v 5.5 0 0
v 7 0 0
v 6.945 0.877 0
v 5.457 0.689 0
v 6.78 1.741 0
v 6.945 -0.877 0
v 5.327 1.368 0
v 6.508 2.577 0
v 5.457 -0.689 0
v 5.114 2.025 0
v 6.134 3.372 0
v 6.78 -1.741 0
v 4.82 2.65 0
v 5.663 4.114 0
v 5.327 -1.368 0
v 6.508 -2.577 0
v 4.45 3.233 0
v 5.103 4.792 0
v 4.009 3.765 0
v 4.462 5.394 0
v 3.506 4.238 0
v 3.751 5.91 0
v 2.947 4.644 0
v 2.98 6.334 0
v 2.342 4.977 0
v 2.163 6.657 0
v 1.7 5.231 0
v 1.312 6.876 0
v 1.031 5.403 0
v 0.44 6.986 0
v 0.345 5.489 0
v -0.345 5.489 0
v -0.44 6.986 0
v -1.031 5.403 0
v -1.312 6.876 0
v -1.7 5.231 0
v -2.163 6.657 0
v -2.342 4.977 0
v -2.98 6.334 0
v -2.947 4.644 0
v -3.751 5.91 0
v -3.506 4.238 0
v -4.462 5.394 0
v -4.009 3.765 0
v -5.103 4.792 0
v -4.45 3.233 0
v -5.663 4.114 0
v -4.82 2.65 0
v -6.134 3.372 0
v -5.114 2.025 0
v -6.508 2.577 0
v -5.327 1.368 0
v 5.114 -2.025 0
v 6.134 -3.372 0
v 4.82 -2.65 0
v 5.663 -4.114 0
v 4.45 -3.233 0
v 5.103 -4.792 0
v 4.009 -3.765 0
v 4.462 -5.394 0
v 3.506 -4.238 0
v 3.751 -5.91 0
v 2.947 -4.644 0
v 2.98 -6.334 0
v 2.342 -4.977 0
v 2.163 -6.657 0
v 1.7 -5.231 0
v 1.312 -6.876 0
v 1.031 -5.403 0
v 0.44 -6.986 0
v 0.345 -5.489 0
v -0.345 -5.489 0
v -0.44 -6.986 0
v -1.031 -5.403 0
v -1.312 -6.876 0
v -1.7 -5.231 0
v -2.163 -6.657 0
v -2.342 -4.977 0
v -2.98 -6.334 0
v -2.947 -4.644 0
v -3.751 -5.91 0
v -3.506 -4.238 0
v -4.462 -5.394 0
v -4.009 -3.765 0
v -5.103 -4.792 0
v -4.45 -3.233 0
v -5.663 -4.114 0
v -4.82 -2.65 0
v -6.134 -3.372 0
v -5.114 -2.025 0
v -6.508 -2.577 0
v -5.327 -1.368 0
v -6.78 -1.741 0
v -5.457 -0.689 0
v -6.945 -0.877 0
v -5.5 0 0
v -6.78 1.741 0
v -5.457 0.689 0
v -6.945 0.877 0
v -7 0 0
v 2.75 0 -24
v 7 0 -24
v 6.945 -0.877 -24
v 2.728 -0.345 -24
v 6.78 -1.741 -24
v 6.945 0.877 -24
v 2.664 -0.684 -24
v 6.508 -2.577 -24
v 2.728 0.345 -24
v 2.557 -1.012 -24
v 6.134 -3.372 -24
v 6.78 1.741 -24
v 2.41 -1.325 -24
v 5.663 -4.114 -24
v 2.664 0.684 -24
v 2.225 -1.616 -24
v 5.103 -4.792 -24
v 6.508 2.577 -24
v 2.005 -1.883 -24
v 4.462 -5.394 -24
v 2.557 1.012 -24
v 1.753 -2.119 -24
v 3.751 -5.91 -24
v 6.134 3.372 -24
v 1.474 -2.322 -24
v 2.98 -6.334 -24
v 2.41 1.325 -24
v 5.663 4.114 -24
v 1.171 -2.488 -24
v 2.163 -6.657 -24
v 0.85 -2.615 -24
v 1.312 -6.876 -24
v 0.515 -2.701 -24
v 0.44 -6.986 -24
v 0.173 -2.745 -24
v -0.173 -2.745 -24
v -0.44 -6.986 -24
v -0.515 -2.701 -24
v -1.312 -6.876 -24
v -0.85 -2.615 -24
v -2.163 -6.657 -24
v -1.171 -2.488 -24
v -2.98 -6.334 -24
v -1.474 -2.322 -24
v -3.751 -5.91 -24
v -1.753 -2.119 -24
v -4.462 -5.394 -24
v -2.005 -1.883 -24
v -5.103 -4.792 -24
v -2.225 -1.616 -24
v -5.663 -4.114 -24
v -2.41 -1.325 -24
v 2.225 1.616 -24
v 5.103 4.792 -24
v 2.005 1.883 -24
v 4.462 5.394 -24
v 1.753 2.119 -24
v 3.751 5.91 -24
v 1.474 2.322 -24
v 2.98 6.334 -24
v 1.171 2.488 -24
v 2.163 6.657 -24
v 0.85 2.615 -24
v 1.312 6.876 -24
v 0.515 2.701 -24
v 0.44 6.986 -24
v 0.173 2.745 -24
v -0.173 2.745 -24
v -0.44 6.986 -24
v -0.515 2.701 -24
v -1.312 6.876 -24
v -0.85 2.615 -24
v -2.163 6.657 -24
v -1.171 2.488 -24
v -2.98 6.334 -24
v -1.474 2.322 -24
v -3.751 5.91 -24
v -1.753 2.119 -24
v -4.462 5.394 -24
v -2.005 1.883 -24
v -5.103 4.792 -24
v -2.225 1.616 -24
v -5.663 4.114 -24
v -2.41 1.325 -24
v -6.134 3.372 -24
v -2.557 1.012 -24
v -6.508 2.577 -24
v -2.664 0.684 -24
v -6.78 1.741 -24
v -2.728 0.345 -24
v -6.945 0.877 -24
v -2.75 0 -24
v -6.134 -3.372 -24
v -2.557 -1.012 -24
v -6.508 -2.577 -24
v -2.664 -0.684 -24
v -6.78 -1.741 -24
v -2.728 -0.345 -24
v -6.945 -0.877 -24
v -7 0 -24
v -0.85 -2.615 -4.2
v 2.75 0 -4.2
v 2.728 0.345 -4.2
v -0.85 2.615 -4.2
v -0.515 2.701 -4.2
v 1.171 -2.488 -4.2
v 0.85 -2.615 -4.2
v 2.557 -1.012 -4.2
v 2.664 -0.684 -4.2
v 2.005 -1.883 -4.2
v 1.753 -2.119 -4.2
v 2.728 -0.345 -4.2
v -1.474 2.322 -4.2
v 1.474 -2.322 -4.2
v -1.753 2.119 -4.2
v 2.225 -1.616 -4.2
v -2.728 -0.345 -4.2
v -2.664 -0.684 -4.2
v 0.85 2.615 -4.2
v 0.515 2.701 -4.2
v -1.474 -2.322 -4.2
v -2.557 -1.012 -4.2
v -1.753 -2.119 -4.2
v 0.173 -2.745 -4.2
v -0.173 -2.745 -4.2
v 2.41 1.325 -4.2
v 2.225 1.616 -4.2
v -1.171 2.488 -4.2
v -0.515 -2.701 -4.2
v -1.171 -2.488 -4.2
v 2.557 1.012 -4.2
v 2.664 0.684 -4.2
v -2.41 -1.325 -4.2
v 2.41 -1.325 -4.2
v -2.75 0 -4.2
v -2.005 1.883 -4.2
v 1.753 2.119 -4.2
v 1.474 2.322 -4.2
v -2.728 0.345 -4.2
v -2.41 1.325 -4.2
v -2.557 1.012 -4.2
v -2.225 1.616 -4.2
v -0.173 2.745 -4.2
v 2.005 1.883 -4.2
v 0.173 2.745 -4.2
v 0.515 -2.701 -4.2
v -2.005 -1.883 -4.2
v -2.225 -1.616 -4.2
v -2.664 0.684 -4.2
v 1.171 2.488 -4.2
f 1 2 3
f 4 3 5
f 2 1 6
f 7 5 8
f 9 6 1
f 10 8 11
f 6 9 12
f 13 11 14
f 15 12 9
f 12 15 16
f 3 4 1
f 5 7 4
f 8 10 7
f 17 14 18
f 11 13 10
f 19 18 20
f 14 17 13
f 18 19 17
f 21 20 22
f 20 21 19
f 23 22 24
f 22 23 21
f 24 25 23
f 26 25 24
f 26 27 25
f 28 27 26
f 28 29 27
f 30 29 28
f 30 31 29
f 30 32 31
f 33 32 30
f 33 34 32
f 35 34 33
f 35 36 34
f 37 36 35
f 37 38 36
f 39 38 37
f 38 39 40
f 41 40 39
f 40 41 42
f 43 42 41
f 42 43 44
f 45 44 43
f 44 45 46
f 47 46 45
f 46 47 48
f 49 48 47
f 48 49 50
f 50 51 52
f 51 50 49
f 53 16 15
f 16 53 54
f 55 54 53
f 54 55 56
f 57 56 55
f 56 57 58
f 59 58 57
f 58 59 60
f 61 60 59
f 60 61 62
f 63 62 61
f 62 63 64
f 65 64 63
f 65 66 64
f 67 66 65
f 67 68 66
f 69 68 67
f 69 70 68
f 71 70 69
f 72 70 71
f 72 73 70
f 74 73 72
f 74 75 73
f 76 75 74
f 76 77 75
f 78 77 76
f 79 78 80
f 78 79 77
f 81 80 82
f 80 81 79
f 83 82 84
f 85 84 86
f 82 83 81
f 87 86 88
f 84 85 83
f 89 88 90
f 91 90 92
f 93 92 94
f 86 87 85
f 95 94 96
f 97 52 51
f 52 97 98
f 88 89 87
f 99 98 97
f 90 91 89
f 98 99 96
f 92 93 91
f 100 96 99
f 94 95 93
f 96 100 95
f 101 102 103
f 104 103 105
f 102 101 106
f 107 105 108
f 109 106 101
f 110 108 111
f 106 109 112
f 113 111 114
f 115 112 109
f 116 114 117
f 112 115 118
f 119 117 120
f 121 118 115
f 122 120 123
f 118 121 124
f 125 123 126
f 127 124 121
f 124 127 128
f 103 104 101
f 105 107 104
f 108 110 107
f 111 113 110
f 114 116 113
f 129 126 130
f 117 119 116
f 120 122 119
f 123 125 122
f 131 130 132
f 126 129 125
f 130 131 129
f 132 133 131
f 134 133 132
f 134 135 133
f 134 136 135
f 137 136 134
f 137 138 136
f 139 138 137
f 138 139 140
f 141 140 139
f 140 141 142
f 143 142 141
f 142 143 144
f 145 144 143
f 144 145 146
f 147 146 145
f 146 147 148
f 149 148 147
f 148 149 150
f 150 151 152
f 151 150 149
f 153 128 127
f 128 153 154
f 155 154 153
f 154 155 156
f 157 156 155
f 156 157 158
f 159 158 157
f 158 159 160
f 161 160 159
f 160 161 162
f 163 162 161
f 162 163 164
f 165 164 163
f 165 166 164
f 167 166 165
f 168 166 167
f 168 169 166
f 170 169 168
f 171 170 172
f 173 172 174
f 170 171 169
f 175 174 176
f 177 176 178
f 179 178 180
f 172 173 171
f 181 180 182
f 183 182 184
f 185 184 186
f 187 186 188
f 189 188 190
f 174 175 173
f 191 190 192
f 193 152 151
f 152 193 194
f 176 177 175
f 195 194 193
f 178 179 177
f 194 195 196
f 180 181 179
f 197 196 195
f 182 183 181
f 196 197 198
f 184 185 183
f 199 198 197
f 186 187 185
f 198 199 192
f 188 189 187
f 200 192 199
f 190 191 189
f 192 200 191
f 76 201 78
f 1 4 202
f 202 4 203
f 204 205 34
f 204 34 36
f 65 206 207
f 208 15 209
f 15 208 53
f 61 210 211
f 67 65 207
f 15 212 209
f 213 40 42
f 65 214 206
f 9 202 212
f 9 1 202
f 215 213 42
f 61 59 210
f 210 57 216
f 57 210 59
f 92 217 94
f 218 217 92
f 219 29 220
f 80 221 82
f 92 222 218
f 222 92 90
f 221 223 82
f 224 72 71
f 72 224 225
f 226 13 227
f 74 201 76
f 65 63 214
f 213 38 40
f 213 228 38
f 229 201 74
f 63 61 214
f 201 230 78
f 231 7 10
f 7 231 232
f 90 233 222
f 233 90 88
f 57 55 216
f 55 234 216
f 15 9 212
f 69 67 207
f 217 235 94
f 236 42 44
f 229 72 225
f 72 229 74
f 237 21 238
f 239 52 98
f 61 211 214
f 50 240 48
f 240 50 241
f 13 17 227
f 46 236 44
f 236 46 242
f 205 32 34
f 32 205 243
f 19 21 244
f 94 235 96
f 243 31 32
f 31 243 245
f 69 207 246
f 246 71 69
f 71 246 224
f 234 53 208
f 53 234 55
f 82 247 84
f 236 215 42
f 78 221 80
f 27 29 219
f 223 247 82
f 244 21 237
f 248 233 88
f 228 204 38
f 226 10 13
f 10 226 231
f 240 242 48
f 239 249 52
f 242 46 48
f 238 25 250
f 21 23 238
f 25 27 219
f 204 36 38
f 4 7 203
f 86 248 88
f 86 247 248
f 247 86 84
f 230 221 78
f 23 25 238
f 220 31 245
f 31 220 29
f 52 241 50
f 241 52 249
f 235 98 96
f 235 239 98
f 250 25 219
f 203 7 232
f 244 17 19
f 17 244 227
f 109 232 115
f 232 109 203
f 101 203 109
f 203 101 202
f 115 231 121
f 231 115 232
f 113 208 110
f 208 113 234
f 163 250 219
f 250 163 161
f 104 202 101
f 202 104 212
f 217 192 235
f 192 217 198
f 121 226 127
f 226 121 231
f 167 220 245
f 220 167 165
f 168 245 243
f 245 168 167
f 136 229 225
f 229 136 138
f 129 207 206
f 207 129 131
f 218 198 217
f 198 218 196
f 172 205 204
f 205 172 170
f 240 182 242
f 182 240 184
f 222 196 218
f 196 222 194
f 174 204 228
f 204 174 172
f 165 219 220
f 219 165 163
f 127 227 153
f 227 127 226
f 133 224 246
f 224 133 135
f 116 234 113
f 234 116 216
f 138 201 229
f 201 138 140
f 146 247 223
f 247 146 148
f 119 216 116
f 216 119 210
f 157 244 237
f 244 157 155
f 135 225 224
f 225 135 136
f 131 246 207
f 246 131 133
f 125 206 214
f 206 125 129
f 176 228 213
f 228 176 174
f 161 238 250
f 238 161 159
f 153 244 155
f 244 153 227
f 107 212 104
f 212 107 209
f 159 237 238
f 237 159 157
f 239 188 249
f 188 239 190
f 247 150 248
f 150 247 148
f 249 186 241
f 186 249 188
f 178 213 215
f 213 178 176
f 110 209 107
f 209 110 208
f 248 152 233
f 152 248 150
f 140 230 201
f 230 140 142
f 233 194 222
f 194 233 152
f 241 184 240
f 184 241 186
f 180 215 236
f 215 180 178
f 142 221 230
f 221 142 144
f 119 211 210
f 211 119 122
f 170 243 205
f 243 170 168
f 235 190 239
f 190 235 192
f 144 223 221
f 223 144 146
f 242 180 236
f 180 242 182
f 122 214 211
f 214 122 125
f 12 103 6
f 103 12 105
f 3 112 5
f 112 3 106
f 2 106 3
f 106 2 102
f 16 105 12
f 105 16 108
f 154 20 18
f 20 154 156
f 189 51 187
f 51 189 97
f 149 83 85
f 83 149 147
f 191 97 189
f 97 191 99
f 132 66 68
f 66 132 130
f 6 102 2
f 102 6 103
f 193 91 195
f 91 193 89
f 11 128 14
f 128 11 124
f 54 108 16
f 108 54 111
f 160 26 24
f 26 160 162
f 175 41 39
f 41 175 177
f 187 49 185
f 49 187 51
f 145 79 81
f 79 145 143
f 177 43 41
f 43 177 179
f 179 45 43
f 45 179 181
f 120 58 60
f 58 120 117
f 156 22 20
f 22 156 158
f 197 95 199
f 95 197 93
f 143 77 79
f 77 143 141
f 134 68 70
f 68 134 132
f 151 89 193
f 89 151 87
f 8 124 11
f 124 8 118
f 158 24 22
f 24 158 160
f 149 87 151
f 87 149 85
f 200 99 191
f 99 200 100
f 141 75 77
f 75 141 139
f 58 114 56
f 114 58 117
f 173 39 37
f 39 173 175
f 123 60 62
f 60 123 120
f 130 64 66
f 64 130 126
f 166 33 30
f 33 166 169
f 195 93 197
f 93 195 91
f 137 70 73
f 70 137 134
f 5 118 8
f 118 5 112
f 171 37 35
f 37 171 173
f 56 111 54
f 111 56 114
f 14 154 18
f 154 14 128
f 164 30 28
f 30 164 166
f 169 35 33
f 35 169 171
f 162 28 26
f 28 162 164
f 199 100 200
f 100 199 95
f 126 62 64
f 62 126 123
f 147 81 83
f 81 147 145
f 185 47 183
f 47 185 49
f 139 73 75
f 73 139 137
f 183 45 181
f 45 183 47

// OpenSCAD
$fn = 50;


difference() {
	union() {
		translate(v = [0, 0, -24.0000000000]) {
			cylinder(h = 24, r = 7.0000000000);
		}
		cylinder(h = 0, r = 17.0000000000);
	}
	union() {
		translate(v = [0, 0, 0]) {
			rotate(a = [0, 0, 0]) {
				difference() {
					union() {
						#translate(v = [0, 0, -24.0000000000]) {
							cylinder(h = 24, r = 2.2500000000);
						}
						#translate(v = [0, 0, -4.2000000000]) {
							cylinder(h = 4.2000000000, r1 = 2.7500000000, r2 = 5.5000000000);
						}
						#translate(v = [0, 0, -24.0000000000]) {
							cylinder(h = 24, r = 2.7500000000);
						}
						#translate(v = [0, 0, -24.0000000000]) {
							cylinder(h = 24, r = 2.2500000000);
						}
					}
					union();
				}
			}
		}
	}
}
